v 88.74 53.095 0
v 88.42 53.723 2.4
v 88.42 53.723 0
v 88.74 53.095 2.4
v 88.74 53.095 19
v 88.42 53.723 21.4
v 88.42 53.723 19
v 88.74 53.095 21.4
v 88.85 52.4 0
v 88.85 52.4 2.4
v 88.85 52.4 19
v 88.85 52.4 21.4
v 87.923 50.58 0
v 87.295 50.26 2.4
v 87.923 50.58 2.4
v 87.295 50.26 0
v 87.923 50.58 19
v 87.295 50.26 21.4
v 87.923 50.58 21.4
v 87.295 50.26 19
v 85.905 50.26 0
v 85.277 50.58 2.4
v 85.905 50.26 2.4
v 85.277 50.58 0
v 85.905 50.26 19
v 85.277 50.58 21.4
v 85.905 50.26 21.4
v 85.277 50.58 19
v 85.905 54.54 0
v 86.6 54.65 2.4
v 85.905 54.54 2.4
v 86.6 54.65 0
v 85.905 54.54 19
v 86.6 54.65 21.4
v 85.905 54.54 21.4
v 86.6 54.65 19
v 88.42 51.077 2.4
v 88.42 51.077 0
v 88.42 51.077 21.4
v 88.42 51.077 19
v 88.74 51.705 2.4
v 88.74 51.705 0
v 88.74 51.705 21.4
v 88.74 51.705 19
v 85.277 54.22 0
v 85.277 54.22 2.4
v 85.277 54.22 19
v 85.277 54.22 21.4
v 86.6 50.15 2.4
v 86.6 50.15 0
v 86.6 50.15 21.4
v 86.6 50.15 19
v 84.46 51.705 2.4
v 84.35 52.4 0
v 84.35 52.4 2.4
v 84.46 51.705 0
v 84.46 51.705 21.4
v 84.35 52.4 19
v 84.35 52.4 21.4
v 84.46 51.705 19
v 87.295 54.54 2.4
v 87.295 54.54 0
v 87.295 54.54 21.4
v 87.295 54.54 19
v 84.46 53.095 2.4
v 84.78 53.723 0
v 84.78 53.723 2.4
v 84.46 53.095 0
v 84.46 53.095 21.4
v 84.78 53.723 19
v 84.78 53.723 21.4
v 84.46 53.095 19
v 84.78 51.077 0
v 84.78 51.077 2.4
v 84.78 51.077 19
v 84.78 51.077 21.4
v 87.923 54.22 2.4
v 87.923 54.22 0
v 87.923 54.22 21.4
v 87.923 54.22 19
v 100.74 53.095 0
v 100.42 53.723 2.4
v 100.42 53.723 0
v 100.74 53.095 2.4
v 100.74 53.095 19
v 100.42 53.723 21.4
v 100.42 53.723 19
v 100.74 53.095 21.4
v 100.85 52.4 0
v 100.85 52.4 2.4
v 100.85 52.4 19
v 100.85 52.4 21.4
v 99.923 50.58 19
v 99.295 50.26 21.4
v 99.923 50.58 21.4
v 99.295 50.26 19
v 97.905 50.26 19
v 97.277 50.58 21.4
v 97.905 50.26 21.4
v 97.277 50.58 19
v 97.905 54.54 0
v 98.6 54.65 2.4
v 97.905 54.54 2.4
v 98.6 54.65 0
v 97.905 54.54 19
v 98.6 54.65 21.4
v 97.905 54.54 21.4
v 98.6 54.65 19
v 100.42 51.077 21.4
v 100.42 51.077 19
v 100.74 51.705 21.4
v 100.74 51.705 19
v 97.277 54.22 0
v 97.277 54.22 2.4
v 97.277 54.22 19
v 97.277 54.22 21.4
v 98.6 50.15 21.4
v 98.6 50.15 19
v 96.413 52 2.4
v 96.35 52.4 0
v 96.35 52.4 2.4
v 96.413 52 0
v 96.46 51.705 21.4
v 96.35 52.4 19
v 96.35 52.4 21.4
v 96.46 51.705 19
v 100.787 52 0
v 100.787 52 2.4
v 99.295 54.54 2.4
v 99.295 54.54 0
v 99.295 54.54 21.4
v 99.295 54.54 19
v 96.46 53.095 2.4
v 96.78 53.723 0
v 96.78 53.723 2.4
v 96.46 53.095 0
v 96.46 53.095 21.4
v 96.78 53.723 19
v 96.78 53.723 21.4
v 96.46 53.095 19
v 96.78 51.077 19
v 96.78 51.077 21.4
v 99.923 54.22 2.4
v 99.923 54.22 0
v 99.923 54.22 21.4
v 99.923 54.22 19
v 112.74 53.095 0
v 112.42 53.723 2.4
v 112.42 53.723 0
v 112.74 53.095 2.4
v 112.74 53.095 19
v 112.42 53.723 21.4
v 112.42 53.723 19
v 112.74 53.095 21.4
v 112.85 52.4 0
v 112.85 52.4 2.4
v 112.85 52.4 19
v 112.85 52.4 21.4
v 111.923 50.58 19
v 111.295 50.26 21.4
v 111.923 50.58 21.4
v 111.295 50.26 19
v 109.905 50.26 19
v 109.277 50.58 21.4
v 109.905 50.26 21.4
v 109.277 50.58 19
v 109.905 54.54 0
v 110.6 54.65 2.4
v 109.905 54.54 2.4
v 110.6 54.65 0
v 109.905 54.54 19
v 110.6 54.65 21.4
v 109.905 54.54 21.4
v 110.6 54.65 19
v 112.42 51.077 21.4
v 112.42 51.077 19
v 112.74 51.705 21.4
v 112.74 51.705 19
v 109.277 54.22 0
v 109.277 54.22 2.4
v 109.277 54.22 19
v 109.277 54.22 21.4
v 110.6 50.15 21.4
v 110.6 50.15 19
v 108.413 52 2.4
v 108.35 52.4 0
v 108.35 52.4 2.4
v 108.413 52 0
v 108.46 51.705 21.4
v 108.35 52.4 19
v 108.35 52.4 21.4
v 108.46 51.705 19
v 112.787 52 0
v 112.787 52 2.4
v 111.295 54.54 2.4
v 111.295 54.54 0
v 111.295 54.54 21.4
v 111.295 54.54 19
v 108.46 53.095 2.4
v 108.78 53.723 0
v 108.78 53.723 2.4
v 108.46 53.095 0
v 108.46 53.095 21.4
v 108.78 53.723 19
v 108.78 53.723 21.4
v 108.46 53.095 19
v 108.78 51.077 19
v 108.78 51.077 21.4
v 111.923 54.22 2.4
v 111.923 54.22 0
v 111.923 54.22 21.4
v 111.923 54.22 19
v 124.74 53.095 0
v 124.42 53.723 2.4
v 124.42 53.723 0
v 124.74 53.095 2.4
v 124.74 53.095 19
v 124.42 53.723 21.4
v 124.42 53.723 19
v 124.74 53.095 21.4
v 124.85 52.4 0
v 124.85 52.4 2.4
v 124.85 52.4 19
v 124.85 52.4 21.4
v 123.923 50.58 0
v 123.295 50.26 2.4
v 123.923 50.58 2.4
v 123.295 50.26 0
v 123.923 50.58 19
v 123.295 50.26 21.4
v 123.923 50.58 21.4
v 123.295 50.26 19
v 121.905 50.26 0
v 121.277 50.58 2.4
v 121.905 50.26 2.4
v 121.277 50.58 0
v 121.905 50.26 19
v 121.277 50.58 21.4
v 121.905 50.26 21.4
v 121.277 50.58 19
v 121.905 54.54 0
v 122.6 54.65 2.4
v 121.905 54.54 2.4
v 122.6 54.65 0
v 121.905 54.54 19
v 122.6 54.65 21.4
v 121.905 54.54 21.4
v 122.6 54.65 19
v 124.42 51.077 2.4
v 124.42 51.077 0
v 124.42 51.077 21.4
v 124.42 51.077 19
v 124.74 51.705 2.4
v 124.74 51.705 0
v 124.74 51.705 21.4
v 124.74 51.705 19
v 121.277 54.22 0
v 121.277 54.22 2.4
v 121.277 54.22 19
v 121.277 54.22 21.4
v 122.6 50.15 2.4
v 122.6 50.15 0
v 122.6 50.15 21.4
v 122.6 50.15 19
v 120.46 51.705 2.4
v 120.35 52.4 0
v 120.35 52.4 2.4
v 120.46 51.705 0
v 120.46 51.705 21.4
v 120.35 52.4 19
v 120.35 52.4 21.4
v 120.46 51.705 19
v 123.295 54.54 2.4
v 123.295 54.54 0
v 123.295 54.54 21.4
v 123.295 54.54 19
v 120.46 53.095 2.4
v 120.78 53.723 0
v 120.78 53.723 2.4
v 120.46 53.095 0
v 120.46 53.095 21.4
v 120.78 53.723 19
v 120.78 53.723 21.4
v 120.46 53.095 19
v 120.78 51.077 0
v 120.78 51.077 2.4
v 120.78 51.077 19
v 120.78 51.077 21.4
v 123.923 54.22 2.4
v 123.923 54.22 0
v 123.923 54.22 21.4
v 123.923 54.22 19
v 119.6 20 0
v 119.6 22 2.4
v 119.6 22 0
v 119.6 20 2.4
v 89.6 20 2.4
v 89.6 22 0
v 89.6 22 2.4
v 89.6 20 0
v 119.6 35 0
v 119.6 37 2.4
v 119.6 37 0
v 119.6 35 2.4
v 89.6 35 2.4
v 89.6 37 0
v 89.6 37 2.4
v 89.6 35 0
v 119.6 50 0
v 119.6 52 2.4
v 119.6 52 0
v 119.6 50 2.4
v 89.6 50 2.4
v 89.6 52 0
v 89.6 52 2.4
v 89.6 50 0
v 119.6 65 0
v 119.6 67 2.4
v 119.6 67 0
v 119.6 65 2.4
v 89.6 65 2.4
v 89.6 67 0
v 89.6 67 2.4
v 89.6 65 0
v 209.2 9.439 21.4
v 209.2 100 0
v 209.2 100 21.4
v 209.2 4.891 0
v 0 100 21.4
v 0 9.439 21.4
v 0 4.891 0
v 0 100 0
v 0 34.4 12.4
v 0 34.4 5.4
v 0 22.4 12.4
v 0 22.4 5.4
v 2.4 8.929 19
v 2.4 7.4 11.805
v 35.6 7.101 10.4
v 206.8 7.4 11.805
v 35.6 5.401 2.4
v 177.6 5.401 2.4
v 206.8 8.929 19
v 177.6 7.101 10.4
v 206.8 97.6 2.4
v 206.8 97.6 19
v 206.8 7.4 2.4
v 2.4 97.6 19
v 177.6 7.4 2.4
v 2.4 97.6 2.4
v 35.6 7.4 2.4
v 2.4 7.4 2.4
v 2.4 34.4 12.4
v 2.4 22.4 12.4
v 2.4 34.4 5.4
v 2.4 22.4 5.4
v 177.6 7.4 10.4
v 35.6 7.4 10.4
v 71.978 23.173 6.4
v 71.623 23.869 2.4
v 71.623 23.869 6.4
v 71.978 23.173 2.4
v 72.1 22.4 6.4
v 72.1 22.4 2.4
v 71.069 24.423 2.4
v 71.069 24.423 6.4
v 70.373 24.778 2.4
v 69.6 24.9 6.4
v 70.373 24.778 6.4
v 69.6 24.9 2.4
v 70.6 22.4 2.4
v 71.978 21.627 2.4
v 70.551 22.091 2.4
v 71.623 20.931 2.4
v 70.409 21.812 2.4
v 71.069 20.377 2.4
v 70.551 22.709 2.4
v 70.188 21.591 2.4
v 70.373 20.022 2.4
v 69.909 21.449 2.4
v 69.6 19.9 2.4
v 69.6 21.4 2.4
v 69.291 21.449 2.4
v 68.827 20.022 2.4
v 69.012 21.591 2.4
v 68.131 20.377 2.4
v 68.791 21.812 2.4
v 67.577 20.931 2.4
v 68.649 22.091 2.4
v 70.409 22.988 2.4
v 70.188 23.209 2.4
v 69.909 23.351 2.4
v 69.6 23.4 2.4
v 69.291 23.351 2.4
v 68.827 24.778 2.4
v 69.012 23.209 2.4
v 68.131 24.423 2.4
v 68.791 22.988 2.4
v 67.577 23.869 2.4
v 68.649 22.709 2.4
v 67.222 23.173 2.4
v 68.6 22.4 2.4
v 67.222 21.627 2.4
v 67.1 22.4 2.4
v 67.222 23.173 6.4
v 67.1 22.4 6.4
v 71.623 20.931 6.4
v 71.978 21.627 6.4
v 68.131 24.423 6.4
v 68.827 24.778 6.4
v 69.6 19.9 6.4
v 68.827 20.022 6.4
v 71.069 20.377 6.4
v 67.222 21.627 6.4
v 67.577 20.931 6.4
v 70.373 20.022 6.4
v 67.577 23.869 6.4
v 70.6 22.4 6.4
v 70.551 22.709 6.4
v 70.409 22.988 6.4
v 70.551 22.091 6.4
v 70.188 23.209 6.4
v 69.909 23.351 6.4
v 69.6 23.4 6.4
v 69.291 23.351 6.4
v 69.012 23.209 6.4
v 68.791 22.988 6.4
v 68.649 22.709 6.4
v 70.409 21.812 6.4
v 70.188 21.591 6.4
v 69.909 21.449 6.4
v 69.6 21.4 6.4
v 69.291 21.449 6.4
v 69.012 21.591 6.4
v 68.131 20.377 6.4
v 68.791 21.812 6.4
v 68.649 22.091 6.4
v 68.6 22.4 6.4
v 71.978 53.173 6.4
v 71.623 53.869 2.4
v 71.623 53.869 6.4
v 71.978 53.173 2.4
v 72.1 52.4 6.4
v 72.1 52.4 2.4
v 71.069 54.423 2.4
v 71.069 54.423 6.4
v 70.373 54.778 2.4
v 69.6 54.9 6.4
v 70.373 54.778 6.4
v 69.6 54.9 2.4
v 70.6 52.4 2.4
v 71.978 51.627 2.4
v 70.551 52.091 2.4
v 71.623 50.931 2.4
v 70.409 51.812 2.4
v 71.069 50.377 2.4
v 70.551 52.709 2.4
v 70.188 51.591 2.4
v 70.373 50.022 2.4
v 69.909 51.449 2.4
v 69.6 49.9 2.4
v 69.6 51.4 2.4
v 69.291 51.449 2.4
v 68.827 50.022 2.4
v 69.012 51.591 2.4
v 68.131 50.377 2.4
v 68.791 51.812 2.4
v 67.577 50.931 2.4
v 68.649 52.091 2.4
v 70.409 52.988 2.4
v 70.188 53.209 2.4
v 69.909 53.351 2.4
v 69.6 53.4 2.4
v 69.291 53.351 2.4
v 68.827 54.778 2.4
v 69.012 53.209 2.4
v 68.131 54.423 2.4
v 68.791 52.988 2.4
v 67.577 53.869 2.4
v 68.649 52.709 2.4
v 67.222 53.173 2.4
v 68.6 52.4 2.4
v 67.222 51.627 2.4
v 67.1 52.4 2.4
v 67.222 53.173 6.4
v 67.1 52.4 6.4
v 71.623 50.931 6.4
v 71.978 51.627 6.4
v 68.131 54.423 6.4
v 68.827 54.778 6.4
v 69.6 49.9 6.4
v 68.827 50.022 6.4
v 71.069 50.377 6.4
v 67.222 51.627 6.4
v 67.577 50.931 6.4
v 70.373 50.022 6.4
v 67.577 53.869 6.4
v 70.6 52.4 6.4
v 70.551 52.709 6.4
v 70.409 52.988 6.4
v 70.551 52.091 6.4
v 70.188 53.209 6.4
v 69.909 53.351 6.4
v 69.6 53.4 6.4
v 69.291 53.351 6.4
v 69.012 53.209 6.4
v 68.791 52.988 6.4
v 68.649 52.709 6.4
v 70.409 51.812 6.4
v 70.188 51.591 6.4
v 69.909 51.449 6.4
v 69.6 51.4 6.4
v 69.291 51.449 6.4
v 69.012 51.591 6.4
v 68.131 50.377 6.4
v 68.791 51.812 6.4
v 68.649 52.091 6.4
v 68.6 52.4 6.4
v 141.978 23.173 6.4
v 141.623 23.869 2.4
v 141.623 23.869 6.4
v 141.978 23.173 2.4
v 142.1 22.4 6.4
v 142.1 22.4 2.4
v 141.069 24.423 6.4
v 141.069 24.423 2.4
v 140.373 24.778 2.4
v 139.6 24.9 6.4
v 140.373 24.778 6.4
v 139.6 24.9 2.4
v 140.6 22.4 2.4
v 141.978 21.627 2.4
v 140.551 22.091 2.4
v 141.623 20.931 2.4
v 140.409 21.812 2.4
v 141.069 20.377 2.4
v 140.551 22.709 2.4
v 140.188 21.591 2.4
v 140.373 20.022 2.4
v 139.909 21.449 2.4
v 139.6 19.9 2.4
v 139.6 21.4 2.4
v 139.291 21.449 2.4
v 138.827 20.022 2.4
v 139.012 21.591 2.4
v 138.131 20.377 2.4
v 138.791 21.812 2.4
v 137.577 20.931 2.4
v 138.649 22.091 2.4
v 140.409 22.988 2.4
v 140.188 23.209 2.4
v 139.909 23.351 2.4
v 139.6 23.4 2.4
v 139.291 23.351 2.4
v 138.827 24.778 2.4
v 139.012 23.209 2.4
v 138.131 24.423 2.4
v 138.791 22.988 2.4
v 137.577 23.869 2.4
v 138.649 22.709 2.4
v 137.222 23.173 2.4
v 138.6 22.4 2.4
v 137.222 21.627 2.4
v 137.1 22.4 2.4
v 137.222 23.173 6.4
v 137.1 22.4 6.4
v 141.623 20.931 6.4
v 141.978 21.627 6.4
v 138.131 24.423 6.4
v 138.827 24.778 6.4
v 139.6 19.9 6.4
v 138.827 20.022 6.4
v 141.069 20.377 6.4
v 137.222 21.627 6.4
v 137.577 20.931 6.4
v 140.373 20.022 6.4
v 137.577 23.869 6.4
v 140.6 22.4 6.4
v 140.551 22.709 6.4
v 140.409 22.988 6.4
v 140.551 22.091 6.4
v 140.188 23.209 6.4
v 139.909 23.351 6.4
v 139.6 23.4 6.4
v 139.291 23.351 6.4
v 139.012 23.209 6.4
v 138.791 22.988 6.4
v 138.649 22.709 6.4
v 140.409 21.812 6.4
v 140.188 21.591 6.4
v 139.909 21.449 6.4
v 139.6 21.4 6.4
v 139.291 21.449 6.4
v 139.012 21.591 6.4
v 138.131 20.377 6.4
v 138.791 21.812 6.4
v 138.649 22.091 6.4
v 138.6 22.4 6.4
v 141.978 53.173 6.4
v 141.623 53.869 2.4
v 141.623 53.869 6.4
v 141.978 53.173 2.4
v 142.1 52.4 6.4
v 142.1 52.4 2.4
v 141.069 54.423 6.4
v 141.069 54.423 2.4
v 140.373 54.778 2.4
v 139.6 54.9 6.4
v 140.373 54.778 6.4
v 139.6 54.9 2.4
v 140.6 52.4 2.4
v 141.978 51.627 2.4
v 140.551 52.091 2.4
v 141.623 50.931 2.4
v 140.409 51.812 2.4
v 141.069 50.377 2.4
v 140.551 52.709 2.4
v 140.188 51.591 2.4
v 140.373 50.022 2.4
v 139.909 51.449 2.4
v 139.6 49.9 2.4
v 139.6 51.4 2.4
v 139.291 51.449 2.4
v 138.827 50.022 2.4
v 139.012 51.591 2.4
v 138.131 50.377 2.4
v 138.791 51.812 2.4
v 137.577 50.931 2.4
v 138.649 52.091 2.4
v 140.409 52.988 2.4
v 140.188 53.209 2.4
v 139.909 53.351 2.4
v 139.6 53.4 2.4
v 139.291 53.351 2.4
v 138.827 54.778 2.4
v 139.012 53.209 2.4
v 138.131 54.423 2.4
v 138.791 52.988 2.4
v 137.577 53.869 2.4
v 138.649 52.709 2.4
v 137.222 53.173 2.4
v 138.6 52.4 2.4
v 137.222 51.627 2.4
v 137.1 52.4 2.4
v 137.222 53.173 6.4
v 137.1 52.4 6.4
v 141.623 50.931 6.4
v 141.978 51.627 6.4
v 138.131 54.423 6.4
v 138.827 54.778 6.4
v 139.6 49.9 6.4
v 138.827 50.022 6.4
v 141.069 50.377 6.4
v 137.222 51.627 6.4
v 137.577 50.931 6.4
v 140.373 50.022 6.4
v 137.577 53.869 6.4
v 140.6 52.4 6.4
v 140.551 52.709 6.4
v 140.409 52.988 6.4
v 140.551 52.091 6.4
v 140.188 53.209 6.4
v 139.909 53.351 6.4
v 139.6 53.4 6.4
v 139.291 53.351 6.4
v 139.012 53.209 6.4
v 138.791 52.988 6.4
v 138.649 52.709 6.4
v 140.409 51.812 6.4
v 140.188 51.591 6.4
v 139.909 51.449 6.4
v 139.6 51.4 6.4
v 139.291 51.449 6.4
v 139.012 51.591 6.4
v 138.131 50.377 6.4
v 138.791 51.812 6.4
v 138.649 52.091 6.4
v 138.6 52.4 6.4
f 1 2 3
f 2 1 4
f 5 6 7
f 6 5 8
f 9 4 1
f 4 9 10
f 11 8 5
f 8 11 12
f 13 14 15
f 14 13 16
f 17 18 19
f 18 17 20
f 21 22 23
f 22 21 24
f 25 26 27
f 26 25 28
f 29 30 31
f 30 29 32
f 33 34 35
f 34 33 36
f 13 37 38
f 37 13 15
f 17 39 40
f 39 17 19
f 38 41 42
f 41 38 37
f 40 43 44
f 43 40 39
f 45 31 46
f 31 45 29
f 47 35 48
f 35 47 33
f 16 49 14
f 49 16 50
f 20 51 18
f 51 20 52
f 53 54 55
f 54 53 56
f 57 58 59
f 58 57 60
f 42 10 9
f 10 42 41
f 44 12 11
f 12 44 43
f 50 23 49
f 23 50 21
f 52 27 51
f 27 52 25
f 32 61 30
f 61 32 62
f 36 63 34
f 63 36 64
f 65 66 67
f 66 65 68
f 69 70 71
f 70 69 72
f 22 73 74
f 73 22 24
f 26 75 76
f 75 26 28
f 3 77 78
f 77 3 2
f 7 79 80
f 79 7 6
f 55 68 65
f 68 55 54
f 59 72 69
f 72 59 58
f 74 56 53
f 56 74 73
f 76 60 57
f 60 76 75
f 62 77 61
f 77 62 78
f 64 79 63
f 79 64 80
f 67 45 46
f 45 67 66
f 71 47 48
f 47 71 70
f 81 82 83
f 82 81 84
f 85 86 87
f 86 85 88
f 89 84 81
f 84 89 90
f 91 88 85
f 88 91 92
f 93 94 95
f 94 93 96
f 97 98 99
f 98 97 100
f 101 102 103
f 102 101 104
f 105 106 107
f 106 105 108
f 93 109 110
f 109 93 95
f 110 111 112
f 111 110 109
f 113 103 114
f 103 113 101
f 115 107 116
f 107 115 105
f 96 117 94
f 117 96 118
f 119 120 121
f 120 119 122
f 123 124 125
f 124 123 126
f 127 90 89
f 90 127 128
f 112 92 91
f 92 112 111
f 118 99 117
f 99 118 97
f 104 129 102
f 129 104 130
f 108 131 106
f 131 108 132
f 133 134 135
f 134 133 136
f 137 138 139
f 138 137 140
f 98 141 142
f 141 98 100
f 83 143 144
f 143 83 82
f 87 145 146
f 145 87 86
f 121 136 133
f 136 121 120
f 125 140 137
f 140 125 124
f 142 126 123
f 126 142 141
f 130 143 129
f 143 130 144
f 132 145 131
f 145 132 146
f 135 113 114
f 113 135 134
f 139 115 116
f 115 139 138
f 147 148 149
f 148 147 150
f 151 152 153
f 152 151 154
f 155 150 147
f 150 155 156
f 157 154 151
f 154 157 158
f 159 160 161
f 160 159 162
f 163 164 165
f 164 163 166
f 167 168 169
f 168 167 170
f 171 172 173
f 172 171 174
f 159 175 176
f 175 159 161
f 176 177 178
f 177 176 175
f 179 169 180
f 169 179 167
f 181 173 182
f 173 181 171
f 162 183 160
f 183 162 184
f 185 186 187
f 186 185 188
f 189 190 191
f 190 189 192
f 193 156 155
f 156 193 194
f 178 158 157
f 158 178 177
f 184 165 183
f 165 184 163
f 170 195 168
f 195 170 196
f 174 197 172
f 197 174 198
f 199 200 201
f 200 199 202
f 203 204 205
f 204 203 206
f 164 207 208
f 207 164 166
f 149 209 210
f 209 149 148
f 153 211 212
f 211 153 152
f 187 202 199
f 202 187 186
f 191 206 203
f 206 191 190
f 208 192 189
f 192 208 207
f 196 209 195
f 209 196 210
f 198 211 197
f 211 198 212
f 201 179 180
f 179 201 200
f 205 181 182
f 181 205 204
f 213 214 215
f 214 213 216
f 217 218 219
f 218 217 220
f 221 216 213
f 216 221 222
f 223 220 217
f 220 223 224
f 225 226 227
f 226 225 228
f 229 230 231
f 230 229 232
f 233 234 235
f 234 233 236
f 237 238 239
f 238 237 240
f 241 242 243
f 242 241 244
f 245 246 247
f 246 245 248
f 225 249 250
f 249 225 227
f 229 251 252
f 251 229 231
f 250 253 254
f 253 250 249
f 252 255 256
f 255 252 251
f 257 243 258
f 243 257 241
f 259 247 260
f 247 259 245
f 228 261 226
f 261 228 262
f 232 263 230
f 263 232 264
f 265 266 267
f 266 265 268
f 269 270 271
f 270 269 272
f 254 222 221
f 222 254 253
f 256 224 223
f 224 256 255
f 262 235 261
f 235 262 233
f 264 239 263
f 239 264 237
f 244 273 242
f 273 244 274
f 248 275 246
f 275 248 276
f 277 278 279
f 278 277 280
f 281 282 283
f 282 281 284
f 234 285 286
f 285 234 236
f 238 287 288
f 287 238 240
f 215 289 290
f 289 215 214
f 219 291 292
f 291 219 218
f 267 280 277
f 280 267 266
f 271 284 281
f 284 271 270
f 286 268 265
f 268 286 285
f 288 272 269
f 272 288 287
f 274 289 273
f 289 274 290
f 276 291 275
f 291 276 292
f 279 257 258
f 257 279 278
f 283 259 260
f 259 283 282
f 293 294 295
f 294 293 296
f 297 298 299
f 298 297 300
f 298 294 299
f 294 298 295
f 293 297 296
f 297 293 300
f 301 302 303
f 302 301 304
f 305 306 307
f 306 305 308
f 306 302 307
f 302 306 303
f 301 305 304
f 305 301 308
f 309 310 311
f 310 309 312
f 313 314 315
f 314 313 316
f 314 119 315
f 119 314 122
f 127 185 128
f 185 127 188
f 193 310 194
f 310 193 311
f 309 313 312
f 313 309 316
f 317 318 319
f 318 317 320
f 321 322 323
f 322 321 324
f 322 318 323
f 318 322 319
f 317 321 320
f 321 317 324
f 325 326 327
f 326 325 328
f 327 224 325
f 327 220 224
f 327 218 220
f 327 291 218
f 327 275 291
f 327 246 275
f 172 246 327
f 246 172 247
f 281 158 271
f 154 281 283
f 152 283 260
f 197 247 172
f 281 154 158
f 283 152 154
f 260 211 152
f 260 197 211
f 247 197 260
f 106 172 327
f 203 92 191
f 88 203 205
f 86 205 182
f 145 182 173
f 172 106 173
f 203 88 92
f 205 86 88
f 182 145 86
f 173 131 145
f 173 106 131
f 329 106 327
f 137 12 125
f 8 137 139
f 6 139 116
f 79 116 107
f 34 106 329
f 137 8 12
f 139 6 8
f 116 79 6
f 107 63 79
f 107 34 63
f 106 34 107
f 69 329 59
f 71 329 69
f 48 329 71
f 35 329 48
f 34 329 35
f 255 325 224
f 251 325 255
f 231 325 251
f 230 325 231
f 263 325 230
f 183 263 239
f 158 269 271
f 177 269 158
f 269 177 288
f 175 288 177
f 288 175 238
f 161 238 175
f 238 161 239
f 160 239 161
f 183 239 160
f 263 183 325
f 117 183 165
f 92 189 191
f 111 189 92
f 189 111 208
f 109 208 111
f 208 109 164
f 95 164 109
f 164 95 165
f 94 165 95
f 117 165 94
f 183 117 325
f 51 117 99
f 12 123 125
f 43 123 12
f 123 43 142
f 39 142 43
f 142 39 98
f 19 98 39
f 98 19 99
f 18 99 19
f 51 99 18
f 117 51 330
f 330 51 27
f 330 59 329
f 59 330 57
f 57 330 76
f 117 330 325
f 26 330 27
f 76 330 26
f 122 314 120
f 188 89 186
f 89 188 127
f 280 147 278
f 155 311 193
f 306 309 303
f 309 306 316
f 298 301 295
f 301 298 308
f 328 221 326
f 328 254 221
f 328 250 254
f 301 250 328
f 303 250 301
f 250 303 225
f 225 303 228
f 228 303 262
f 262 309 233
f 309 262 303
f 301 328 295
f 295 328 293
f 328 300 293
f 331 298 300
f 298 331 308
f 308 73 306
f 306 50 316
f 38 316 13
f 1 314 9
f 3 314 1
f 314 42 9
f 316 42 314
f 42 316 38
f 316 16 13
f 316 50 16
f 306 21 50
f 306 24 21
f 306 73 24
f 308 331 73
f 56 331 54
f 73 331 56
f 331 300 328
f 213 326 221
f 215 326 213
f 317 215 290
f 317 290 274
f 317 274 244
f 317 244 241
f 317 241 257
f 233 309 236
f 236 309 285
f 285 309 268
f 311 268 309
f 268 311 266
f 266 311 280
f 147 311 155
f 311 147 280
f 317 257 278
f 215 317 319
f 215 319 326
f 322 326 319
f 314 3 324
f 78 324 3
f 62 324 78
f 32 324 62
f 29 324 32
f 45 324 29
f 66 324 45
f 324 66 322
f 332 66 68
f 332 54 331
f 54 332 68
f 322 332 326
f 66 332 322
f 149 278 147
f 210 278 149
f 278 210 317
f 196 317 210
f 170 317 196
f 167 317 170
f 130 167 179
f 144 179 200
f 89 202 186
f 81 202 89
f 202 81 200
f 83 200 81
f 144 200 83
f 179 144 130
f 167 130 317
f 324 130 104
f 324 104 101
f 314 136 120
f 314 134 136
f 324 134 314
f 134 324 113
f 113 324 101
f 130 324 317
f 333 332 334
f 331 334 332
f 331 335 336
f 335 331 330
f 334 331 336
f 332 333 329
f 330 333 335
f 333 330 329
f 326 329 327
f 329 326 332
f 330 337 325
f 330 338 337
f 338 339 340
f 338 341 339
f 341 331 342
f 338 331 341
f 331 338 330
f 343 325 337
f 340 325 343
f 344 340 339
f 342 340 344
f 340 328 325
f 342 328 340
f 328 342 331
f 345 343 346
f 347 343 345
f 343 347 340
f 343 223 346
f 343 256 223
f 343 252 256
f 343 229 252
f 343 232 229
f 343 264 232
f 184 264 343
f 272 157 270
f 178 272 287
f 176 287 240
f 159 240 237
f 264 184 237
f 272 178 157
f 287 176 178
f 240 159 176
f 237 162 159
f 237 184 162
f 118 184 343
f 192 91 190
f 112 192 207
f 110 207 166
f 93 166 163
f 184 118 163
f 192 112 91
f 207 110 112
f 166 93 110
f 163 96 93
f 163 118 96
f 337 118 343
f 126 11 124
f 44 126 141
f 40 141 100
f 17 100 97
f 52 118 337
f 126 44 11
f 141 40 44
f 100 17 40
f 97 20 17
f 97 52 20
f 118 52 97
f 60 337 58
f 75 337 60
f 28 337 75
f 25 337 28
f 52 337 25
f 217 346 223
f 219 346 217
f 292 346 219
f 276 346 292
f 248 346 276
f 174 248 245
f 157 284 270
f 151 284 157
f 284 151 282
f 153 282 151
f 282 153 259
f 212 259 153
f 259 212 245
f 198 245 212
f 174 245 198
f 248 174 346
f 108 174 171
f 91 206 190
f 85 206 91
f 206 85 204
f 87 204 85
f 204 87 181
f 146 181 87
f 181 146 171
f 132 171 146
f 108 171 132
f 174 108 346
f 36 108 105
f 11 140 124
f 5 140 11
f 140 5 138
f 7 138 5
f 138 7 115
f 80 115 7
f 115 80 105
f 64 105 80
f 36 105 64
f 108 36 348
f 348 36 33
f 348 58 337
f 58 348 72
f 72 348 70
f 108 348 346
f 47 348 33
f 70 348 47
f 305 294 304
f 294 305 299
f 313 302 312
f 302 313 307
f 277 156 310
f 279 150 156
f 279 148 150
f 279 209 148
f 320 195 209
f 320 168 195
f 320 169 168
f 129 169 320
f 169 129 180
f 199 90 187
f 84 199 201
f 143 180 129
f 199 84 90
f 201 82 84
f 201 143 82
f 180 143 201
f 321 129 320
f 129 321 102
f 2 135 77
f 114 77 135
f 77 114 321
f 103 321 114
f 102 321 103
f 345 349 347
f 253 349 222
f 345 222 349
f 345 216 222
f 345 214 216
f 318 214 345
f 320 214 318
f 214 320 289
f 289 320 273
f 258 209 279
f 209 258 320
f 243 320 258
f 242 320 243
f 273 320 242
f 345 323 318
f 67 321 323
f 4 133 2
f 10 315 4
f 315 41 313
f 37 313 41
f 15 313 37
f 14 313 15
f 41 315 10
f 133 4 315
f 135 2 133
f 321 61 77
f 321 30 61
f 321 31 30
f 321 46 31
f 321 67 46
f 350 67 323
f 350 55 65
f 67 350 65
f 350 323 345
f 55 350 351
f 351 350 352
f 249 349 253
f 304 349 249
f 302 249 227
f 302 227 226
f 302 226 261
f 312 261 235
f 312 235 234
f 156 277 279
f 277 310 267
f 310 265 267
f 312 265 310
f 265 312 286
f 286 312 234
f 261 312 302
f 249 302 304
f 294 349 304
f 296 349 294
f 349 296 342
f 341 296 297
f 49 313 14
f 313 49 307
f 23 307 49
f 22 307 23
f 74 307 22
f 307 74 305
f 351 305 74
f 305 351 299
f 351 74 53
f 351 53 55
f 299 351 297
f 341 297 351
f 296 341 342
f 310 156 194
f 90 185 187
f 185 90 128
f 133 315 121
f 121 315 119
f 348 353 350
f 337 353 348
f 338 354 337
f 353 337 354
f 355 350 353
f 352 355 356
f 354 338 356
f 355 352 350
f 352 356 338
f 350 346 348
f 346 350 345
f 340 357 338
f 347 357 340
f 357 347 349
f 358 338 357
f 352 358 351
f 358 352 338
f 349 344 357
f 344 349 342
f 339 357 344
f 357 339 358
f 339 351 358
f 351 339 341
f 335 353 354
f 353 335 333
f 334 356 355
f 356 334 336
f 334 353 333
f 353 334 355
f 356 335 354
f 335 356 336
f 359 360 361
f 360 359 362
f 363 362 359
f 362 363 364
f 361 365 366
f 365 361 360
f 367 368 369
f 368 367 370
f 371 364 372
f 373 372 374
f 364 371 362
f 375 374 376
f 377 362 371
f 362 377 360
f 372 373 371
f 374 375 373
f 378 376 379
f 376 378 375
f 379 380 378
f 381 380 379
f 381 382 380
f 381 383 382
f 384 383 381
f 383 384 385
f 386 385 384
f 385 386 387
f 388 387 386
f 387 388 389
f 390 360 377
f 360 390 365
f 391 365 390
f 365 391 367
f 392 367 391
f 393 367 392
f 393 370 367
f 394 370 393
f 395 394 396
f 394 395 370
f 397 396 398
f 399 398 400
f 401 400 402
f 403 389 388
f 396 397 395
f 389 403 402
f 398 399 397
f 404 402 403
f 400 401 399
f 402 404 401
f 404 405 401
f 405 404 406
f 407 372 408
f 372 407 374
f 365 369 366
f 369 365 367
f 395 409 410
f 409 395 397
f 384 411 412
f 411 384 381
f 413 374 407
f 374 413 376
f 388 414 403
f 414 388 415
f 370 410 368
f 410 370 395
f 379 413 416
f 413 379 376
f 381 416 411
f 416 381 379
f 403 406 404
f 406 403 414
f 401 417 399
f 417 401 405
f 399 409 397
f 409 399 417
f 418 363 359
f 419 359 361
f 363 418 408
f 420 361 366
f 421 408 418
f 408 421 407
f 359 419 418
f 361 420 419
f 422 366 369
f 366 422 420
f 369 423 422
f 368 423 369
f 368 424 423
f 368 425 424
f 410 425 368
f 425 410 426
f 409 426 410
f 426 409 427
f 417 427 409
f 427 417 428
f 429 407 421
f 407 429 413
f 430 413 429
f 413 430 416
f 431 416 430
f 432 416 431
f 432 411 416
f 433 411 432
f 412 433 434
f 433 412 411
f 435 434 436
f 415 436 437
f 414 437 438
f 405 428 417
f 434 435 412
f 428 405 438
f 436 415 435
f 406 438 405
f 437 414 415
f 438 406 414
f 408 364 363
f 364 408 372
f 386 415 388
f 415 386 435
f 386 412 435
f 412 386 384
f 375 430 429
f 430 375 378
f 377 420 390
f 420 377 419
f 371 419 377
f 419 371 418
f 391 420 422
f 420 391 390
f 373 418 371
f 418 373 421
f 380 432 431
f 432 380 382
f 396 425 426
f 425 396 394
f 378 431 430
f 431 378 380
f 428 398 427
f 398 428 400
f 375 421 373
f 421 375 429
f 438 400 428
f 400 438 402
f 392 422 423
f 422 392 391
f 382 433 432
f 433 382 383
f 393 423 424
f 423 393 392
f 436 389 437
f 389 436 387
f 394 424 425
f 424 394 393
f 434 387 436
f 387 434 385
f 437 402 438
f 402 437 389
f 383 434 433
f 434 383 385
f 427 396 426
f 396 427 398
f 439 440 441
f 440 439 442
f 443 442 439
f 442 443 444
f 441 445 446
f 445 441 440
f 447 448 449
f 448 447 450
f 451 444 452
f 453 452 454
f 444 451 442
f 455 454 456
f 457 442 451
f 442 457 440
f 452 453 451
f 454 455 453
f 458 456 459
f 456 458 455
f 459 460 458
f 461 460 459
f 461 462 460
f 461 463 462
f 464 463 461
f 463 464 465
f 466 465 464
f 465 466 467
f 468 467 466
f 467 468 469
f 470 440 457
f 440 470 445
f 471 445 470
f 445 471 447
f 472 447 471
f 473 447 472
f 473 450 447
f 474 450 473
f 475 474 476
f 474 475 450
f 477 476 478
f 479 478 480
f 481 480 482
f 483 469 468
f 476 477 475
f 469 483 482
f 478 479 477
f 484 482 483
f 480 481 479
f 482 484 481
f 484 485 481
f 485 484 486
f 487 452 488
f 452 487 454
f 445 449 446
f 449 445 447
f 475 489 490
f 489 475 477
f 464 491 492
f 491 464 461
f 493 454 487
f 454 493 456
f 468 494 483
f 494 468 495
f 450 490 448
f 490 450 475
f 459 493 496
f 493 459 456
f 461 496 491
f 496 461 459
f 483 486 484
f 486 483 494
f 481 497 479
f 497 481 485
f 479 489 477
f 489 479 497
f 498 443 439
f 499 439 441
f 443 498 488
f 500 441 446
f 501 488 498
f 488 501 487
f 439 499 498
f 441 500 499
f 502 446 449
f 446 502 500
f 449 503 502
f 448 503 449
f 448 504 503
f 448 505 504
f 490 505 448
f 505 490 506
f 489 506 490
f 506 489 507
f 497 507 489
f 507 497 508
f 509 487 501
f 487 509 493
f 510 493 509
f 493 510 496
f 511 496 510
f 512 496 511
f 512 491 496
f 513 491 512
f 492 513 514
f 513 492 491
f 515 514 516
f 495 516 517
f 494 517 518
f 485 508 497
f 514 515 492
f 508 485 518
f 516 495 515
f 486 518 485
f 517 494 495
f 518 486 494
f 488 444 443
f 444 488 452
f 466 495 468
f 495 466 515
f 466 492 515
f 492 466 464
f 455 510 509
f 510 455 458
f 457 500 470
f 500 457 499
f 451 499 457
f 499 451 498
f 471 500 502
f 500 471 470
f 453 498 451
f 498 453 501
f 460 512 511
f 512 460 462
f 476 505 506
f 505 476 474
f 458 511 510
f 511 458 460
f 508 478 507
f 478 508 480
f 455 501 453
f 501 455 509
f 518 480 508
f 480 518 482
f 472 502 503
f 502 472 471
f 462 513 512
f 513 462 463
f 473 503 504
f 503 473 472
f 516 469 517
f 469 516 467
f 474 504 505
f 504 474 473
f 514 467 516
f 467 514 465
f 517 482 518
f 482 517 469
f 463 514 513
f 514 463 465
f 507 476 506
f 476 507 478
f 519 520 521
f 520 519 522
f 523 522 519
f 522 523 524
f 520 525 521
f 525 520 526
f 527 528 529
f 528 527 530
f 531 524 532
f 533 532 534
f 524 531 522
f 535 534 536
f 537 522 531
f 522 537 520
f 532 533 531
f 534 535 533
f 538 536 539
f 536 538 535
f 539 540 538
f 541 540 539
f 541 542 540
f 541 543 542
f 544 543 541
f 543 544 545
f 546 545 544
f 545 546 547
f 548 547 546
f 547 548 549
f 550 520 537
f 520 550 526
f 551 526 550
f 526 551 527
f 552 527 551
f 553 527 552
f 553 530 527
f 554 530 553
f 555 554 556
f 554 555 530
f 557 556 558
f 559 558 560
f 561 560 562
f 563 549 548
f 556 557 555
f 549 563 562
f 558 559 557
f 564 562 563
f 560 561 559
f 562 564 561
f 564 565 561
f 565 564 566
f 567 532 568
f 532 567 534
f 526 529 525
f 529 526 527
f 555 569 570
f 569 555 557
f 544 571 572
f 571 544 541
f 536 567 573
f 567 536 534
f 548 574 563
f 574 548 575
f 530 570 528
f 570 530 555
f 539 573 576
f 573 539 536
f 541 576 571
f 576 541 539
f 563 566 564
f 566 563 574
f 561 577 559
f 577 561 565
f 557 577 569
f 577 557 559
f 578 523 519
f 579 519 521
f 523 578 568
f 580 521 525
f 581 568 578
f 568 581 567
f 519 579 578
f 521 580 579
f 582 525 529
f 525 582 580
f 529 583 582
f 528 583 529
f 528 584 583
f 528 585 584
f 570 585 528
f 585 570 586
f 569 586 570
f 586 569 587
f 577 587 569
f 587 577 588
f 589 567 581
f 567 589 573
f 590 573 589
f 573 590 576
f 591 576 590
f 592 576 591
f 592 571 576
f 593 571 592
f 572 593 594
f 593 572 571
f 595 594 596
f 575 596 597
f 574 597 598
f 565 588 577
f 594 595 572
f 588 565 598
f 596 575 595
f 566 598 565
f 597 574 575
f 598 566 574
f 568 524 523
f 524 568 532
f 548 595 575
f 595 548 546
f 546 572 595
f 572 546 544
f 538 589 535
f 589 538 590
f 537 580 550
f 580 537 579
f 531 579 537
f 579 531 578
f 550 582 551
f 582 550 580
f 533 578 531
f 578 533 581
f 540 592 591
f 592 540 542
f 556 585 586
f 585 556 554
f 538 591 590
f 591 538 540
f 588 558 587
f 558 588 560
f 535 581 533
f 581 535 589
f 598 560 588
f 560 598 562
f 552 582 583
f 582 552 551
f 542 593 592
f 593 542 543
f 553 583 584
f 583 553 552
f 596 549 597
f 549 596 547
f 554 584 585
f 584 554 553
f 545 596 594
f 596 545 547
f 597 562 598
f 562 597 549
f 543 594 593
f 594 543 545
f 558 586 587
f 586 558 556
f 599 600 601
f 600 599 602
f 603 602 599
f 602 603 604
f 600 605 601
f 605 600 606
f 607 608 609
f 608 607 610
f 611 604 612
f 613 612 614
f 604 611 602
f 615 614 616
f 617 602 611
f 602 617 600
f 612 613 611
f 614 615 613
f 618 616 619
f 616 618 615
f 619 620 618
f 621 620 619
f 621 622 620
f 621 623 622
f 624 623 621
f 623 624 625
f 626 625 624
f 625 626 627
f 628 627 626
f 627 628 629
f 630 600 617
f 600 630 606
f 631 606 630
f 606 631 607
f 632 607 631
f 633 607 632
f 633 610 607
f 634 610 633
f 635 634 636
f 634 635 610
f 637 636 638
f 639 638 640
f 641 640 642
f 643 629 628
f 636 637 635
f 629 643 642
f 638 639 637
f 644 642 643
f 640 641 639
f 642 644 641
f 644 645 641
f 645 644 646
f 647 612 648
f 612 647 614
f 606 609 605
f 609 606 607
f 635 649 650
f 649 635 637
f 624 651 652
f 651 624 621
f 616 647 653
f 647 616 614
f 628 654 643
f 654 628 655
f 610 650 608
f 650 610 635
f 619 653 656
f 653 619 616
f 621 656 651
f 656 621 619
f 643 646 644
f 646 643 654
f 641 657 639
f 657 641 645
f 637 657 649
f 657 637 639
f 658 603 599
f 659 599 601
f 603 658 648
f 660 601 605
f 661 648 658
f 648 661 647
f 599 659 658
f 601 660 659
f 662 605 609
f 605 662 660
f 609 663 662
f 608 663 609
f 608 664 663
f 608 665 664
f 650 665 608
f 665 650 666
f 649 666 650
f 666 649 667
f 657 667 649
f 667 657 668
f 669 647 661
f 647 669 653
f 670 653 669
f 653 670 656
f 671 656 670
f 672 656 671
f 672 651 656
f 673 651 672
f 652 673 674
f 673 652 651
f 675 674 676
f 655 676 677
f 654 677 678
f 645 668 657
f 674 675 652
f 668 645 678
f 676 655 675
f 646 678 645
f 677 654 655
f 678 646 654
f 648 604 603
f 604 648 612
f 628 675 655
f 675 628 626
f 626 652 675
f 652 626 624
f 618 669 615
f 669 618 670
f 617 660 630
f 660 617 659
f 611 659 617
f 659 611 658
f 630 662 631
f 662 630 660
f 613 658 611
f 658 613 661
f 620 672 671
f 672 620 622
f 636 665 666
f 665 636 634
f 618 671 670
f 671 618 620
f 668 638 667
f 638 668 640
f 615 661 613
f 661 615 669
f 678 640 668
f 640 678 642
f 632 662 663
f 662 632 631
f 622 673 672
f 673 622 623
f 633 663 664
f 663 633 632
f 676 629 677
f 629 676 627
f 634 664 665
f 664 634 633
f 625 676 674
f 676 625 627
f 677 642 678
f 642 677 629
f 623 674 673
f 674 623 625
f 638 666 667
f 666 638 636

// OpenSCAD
// file: common.scad
// ============================================================
// Photo Frame for 13.3" Spectra 6 E-Ink Display
// Shared parameters and utility modules
// ============================================================

/* [Display Parameters] */
// Active (visible) area
active_w = 202.8;
active_h = 270.4;
// Glass outline dimensions
glass_w = 208.8;
glass_h = 284.7;
display_d = 0.85;
// Non-active border (asymmetric)
border_left   = 3.0;
border_right  = 3.0;
border_top    = 3.0;
border_bottom = 11.3;   // 284.7 - 270.4 - 3 = 11.3, FPC side, large non-active area

/* [Driver Board Parameters] */
board_w = 80;
board_h = 40;
board_d = 1.6;
board_clearance = 10;     // component height clearance

/* [Battery Parameters] */
battery_w = 60;
battery_h = 35;
battery_d = 8;

/* [Frame Parameters] */
bezel_w    = 10;          // bezel width around active area
wall_thick = 2.4;         // front frame thickness
back_thick = 1.2;         // back panel thickness (6 layers @ 0.2mm)
frame_d    = 2.6;         // total frame depth (1.2mm back + 1.4mm cavity)
tol        = 0.2;
corner_r   = 3;

/* [Channel Parameters] */
outer_wall  = 2.0;        // outer wall thickness on bezel
inner_lip_d = 0.3;        // inner lip depth (presses on display)
channel_tol = 0.2;        // clearance for back panel in channel
lip_overlap = 2.0;        // how much bezel overlaps the glass on each side

/* [Printer Limits] */
bed_max = 260;

/* [Stand Parameters] */
stand_angle = 12;         // tilt angle in degrees
stand_foot_depth = 100;   // how far the base extends back

/* [FPC Cable] */
// 60-pin FPC exits from bottom of display, offset 2mm to the right
fpc_w = 134;              // FPC ribbon width
fpc_slot_w = fpc_w + 8;   // slot width with clearance (+4mm wider)
fpc_offset_x = 2;         // shifted 2mm to the right from center
fpc_slot_h = 6;

/* [Buttons - 1 reset + 3 custom] */
button_dia     = 3.5;
button_spacing = 12;
button_count   = 4;

/* [Joint Parameters] */
tongue_depth  = 1.2;      // tongue-and-groove interlock depth
tongue_length = 15;        // each tongue segment length
tongue_count  = 4;         // number of tongue segments along width
screw_r       = 1.5;       // M3 screw radius

// ============================================================
// Derived dimensions
// ============================================================

cavity_w = glass_w + 2 * tol;
cavity_h = glass_h + 2 * tol;

frame_w = cavity_w + 2 * bezel_w;
frame_h = cavity_h + 2 * bezel_w;

// Back panel rim widths (design parameters)
panel_rim  = 8.2;    // rim on left, right, top
bottom_rim = 0.8;    // thin bottom rim (hidden in base)

// Derived panel dimensions
panel_w = cavity_w + 2 * panel_rim;
panel_h = cavity_h + panel_rim + bottom_rim;
panel_inset = (frame_w - panel_w) / 2;  // how far panel is inset from bezel edge

// Inner lip width: derived to fill gap between panel rim and window
// Layout: outer_wall + channel_tol + panel_rim + channel_tol + inner_lip_w = win_x
inner_lip_w = bezel_w + tol + lip_overlap - outer_wall - panel_rim - 2 * channel_tol;

// Back panel split: bottom piece as tall as fits the bed
back_split_y = bed_max - 10;   // 250mm from bottom, top piece ~60mm

// Base dimensions (foot/stand only, attaches to bottom of back panel)
base_wall = wall_thick;
base_total_depth = stand_foot_depth;

// ============================================================
// Utility modules
// ============================================================

module rounded_rect(w, h, d, r) {
    linear_extrude(d)
        offset(r = r)
            offset(r = -r)
                square([w, h]);
}

module rounded_rect_2d(w, h, r) {
    offset(r = r)
        offset(r = -r)
            square([w, h]);
}

// Tongue segments along X axis at a given Y position
module tongue_strip(width, y_pos, z_pos, depth, length, count) {
    spacing = width / (count + 1);
    for (i = [1 : count]) {
        translate([i * spacing - length / 2, y_pos, z_pos])
            cube([length, depth, back_thick]);
    }
}

// ============================================================
// Front bezel - mitered picture frame style (4 sides)
// ============================================================

// Window position and size (derived from glass position + lip overlap)
win_x = bezel_w + tol + lip_overlap;
win_y = bezel_w + tol + lip_overlap;
win_w = glass_w - 2 * lip_overlap;
win_h = glass_h - 2 * lip_overlap;

// Bezel Z layout:
//   z=0                           bottom of outer wall (back of frame)
//   z=frame_d                     bezel body bottom (= back panel top)
//   z=frame_d+wall_thick          bezel front face

module front_bezel_full() {
    union() {
        // 1. Bezel body (visible frame, sits on top of back panel)
        difference() {
            translate([0, 0, frame_d])
                rounded_rect(frame_w, frame_h, wall_thick, corner_r);

            // Window opening - sharp corners (display glass is rectangular)
            translate([win_x, win_y, -0.1])
                cube([win_w, win_h, frame_d + wall_thick + 0.2]);
        }

        // 2. Outer wall (wraps around back panel edge)
        difference() {
            rounded_rect(frame_w, frame_h, frame_d + wall_thick, corner_r);

            // Hollow inside - sharp corners
            translate([outer_wall, outer_wall, -0.1])
                cube([
                    frame_w - 2 * outer_wall,
                    frame_h - 2 * outer_wall,
                    frame_d + wall_thick + 0.2
                ]);
        }

        // 3. Inner lip (presses on display glass)
        difference() {
            translate([win_x - inner_lip_w, win_y - inner_lip_w, frame_d - inner_lip_d])
                cube([win_w + 2 * inner_lip_w, win_h + 2 * inner_lip_w, inner_lip_d]);

            translate([win_x, win_y, frame_d - inner_lip_d - 0.1])
                cube([win_w, win_h, inner_lip_d + 0.2]);
        }
    }
}

// 45-degree miter cutting regions for each side
// Each region is a 2D polygon extruded tall enough to cut the bezel
e = 1; // margin for clean cuts

// Bottom: below both 45° lines from bottom corners
module miter_region_bottom() {
    linear_extrude(50, center = true)
        polygon([[-e, -e], [frame_w + e, -e], [frame_w / 2, frame_w / 2]]);
}

// Top: above both 45° lines from top corners
module miter_region_top() {
    linear_extrude(50, center = true)
        polygon([[-e, frame_h + e], [frame_w + e, frame_h + e],
                 [frame_w / 2, frame_h - frame_w / 2]]);
}

// Left: between 45° lines from both left corners
module miter_region_left() {
    linear_extrude(50, center = true)
        polygon([[-e, -e], [frame_h / 2, frame_h / 2], [-e, frame_h + e]]);
}

// Right: between 45° lines from both right corners
module miter_region_right() {
    linear_extrude(50, center = true)
        polygon([[frame_w + e, -e],
                 [frame_w - frame_h / 2, frame_h / 2],
                 [frame_w + e, frame_h + e]]);
}

// Full back panel (smaller than bezel, fits inside channel)
module back_panel_full() {
    // FPC slot X position: centered + offset to the right
    fpc_x = (panel_w - fpc_slot_w) / 2 + fpc_offset_x;

    difference() {
        rounded_rect(panel_w, panel_h, frame_d, max(corner_r - panel_inset, 0.5));

        // Display cavity
        translate([panel_rim, bottom_rim, back_thick])
            cube([cavity_w, cavity_h, frame_d]);

        // FPC cable exit slot at bottom (offset 2mm to right)
        translate([fpc_x, -0.1, back_thick])
            cube([fpc_slot_w, bottom_rim + 0.1, frame_d - back_thick + 0.1]);

        // FPC ribbon gap: 4mm zone from panel bottom edge
        // Goes through the full back wall so ribbon can fold freely
        fpc_gap = 4;
        translate([fpc_x, 0, -0.1])
            cube([fpc_slot_w, fpc_gap, frame_d + 0.1]);
    }
}
// main file
// ============================================================
// Base / Stand - Rectangle with angled corner cut
//
// Side view:
//          ╱────────────────────┐
//         ╱                     │
//        ╱  angled cut (12°)    │
//       ╱                       │
//      ╱                        │
//     ╱shelf (panel sits here)  │
//    ╱                          │
//   ╱───────────────────────────┘
//       desk surface
//
// Back panel sits on the front shelf, leans against the angle.
// Bottom bezel clips onto front to lock the panel in.
// ============================================================
include <common.scad>

module base_stand() {
    // Slot at front for back panel
    slot_w      = frame_d + wall_thick;  // panel thickness + clearance
    panel_rest  = base_wall;                   // shelf height for panel

    // Base dimensions
    base_depth  = stand_foot_depth;
    compartment_h = max(board_clearance + board_d, battery_d) + 5;
    base_h      = base_wall + compartment_h + base_wall;

    // The angled cut starts from the shelf step (y=slot_w, z=panel_rest)
    // and goes up at stand_angle from vertical. No vertical front edge.

    difference() {
        // Solid rectangular base
        cube([cavity_w, base_depth, base_h]);

        // 1. Angled cut starting from shelf step (y=slot_w, z=panel_rest)
        //    No vertical front edge - angle goes directly from shelf step to top
        translate([0, slot_w * cos(stand_angle), 0])
            rotate([-stand_angle, 0, 0])
                translate([-0.1, -2 * slot_w, -3])
                    cube([cavity_w + 0.2, 2 * slot_w , base_h * 2]);

        // Interior compartment for board + battery
        translate([base_wall, slot_w + base_wall, base_wall])
            cube([
                cavity_w - 2 * base_wall,
                base_depth - slot_w - 2 * base_wall,
                compartment_h
            ]);

        // FPC cable routing: from slot into compartment (offset 2mm right)
        translate([(cavity_w - fpc_slot_w) / 2 + fpc_offset_x, 0, panel_rest])
            cube([fpc_slot_w, slot_w + base_wall + 1, fpc_slot_h + 2]);

        // Button access holes (top surface, over board area)
        board_x = (cavity_w - board_w) / 2;
        board_y = slot_w + base_wall + 10;
        for (i = [0 : button_count - 1]) {
            bx = board_x + board_w / 2
                 + (i - (button_count - 1) / 2) * button_spacing;
            by = board_y + board_h - 5;
            translate([bx, by, -0.1])
                cylinder(d = button_dia + 1, h = base_h + 0.2, $fn = 20);
        }

        // USB-C port access (left side wall)
        usb_w = 12;
        usb_h = 7;
        translate([-0.1, slot_w + base_wall + 15, base_wall + 3])
            cube([base_wall + 0.2, usb_w, usb_h]);

        // Ventilation slots on bottom
        vent_count = 4;
        vent_w = 30;
        for (i = [0 : vent_count - 1]) {
            translate([
                cavity_w / 2 - vent_w / 2,
                slot_w + 15 + i * 15,
                -0.1
            ])
                cube([vent_w, 2, base_wall + 0.2]);
        }
    }

    // Board standoffs inside compartment
    board_x = (cavity_w - board_w) / 2;
    board_y = slot_w + base_wall + 10;
    standoff_h = 4;
    standoff_r = 2.5;
    for (dx = [5, board_w - 5]) {
        for (dy = [5, board_h - 5]) {
            translate([board_x + dx, board_y + dy, base_wall])
                difference() {
                    cylinder(r = standoff_r, h = standoff_h, $fn = 20);
                    translate([0, 0, -0.1])
                        cylinder(r = 1.0, h = standoff_h + 0.2, $fn = 20);
                }
        }
    }
}

base_stand();
